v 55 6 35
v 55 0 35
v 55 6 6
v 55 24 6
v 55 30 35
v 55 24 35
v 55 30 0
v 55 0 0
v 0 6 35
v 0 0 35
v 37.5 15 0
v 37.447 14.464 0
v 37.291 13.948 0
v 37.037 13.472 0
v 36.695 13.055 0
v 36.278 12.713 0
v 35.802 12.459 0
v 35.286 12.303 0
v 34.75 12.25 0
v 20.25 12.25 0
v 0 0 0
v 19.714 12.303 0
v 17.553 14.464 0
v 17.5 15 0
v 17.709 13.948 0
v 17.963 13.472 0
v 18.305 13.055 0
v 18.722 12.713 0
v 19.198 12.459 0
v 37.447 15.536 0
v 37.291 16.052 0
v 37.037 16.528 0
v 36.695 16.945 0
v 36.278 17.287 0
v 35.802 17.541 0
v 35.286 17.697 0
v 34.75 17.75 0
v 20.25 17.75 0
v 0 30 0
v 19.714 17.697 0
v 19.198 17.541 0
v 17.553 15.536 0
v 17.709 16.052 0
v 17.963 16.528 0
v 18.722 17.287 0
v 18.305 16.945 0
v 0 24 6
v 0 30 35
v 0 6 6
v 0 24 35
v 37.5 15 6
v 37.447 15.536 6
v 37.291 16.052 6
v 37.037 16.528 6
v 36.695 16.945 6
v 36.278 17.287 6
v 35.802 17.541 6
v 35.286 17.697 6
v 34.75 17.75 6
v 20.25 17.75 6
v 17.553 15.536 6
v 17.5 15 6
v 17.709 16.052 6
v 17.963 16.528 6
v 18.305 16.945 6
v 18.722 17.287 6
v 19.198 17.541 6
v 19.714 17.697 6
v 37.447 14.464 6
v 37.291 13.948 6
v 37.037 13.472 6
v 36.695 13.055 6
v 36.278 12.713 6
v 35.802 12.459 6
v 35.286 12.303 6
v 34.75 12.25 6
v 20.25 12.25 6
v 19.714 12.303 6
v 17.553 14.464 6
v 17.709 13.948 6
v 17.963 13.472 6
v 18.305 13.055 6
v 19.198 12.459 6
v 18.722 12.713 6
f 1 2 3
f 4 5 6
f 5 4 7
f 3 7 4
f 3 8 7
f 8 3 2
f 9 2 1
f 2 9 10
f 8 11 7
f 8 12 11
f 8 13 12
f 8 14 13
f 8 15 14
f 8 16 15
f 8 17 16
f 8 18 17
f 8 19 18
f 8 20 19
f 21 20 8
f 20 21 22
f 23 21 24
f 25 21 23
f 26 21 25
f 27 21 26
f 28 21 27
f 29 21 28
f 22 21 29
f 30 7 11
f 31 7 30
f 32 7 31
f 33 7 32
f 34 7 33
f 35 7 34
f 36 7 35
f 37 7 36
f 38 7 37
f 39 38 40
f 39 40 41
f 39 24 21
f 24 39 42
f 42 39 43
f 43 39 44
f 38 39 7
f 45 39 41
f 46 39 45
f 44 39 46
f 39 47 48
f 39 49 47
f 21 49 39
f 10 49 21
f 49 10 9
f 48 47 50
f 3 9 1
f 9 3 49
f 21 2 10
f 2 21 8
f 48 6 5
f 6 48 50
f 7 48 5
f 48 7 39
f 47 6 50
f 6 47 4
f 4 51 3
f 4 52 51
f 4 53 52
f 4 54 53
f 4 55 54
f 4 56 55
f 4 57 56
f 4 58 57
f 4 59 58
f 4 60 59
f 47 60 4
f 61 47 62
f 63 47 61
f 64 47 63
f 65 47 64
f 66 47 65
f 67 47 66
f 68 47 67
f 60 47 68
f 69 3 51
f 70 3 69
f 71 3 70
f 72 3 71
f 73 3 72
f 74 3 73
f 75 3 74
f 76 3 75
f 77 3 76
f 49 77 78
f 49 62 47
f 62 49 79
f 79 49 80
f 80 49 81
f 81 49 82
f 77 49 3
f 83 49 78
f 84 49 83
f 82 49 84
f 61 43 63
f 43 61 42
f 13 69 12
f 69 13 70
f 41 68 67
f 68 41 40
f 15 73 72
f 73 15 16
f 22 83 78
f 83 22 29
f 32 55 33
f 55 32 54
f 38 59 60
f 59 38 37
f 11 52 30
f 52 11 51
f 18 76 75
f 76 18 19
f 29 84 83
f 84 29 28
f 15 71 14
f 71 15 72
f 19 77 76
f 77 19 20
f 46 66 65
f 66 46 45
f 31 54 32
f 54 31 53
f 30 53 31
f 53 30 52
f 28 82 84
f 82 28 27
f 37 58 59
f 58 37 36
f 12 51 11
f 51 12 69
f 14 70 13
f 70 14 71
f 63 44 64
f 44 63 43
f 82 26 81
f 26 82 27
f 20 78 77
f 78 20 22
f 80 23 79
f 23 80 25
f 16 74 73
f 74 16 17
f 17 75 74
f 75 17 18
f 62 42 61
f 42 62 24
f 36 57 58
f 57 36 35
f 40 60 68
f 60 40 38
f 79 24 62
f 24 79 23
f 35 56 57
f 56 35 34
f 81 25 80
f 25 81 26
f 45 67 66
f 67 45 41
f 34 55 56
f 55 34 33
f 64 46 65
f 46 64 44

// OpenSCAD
$fn = 32;

// ----------------------------------------------------------------------
// U-bracket: 55 x 30 x 35 mm
// ----------------------------------------------------------------------

// --- parameters (mm) ---
base_len = 55;            // outer length, X
channel_w = 30;           // outer width, Y
upright_h = 35;           // upright height, Z
mat_t = 6;                // wall thickness
hole_d = 5.5;             // clearance for M5
slot_l = 20;              // slot length

module hole_z(px, py) {
  translate([px, py, -2.5]) cylinder(h = mat_t + 5, d = hole_d);
}
module hole_y_pz(pz) {
  /* through both uprights along Y */
  translate([0, -2.5, pz]) rotate([-90, 0, 0]) cylinder(h = channel_w + 5, d = hole_d);
}
module slot_z(px, py) {
  hull() {
    translate([px - (slot_l - hole_d) / 2, py, -2.5]) cylinder(h = mat_t + 5, d = hole_d);
    translate([px + (slot_l - hole_d) / 2, py, -2.5]) cylinder(h = mat_t + 5, d = hole_d);
  }
}

module base() {
  cube([base_len, channel_w, mat_t]);
}

module uprights() {
  cube([base_len, mat_t, upright_h]);
  translate([0, channel_w - mat_t, 0]) cube([base_len, mat_t, upright_h]);
}

difference() {
  union() {
    base();
    uprights();
  }
  slot_z(27.5, 15);
}
